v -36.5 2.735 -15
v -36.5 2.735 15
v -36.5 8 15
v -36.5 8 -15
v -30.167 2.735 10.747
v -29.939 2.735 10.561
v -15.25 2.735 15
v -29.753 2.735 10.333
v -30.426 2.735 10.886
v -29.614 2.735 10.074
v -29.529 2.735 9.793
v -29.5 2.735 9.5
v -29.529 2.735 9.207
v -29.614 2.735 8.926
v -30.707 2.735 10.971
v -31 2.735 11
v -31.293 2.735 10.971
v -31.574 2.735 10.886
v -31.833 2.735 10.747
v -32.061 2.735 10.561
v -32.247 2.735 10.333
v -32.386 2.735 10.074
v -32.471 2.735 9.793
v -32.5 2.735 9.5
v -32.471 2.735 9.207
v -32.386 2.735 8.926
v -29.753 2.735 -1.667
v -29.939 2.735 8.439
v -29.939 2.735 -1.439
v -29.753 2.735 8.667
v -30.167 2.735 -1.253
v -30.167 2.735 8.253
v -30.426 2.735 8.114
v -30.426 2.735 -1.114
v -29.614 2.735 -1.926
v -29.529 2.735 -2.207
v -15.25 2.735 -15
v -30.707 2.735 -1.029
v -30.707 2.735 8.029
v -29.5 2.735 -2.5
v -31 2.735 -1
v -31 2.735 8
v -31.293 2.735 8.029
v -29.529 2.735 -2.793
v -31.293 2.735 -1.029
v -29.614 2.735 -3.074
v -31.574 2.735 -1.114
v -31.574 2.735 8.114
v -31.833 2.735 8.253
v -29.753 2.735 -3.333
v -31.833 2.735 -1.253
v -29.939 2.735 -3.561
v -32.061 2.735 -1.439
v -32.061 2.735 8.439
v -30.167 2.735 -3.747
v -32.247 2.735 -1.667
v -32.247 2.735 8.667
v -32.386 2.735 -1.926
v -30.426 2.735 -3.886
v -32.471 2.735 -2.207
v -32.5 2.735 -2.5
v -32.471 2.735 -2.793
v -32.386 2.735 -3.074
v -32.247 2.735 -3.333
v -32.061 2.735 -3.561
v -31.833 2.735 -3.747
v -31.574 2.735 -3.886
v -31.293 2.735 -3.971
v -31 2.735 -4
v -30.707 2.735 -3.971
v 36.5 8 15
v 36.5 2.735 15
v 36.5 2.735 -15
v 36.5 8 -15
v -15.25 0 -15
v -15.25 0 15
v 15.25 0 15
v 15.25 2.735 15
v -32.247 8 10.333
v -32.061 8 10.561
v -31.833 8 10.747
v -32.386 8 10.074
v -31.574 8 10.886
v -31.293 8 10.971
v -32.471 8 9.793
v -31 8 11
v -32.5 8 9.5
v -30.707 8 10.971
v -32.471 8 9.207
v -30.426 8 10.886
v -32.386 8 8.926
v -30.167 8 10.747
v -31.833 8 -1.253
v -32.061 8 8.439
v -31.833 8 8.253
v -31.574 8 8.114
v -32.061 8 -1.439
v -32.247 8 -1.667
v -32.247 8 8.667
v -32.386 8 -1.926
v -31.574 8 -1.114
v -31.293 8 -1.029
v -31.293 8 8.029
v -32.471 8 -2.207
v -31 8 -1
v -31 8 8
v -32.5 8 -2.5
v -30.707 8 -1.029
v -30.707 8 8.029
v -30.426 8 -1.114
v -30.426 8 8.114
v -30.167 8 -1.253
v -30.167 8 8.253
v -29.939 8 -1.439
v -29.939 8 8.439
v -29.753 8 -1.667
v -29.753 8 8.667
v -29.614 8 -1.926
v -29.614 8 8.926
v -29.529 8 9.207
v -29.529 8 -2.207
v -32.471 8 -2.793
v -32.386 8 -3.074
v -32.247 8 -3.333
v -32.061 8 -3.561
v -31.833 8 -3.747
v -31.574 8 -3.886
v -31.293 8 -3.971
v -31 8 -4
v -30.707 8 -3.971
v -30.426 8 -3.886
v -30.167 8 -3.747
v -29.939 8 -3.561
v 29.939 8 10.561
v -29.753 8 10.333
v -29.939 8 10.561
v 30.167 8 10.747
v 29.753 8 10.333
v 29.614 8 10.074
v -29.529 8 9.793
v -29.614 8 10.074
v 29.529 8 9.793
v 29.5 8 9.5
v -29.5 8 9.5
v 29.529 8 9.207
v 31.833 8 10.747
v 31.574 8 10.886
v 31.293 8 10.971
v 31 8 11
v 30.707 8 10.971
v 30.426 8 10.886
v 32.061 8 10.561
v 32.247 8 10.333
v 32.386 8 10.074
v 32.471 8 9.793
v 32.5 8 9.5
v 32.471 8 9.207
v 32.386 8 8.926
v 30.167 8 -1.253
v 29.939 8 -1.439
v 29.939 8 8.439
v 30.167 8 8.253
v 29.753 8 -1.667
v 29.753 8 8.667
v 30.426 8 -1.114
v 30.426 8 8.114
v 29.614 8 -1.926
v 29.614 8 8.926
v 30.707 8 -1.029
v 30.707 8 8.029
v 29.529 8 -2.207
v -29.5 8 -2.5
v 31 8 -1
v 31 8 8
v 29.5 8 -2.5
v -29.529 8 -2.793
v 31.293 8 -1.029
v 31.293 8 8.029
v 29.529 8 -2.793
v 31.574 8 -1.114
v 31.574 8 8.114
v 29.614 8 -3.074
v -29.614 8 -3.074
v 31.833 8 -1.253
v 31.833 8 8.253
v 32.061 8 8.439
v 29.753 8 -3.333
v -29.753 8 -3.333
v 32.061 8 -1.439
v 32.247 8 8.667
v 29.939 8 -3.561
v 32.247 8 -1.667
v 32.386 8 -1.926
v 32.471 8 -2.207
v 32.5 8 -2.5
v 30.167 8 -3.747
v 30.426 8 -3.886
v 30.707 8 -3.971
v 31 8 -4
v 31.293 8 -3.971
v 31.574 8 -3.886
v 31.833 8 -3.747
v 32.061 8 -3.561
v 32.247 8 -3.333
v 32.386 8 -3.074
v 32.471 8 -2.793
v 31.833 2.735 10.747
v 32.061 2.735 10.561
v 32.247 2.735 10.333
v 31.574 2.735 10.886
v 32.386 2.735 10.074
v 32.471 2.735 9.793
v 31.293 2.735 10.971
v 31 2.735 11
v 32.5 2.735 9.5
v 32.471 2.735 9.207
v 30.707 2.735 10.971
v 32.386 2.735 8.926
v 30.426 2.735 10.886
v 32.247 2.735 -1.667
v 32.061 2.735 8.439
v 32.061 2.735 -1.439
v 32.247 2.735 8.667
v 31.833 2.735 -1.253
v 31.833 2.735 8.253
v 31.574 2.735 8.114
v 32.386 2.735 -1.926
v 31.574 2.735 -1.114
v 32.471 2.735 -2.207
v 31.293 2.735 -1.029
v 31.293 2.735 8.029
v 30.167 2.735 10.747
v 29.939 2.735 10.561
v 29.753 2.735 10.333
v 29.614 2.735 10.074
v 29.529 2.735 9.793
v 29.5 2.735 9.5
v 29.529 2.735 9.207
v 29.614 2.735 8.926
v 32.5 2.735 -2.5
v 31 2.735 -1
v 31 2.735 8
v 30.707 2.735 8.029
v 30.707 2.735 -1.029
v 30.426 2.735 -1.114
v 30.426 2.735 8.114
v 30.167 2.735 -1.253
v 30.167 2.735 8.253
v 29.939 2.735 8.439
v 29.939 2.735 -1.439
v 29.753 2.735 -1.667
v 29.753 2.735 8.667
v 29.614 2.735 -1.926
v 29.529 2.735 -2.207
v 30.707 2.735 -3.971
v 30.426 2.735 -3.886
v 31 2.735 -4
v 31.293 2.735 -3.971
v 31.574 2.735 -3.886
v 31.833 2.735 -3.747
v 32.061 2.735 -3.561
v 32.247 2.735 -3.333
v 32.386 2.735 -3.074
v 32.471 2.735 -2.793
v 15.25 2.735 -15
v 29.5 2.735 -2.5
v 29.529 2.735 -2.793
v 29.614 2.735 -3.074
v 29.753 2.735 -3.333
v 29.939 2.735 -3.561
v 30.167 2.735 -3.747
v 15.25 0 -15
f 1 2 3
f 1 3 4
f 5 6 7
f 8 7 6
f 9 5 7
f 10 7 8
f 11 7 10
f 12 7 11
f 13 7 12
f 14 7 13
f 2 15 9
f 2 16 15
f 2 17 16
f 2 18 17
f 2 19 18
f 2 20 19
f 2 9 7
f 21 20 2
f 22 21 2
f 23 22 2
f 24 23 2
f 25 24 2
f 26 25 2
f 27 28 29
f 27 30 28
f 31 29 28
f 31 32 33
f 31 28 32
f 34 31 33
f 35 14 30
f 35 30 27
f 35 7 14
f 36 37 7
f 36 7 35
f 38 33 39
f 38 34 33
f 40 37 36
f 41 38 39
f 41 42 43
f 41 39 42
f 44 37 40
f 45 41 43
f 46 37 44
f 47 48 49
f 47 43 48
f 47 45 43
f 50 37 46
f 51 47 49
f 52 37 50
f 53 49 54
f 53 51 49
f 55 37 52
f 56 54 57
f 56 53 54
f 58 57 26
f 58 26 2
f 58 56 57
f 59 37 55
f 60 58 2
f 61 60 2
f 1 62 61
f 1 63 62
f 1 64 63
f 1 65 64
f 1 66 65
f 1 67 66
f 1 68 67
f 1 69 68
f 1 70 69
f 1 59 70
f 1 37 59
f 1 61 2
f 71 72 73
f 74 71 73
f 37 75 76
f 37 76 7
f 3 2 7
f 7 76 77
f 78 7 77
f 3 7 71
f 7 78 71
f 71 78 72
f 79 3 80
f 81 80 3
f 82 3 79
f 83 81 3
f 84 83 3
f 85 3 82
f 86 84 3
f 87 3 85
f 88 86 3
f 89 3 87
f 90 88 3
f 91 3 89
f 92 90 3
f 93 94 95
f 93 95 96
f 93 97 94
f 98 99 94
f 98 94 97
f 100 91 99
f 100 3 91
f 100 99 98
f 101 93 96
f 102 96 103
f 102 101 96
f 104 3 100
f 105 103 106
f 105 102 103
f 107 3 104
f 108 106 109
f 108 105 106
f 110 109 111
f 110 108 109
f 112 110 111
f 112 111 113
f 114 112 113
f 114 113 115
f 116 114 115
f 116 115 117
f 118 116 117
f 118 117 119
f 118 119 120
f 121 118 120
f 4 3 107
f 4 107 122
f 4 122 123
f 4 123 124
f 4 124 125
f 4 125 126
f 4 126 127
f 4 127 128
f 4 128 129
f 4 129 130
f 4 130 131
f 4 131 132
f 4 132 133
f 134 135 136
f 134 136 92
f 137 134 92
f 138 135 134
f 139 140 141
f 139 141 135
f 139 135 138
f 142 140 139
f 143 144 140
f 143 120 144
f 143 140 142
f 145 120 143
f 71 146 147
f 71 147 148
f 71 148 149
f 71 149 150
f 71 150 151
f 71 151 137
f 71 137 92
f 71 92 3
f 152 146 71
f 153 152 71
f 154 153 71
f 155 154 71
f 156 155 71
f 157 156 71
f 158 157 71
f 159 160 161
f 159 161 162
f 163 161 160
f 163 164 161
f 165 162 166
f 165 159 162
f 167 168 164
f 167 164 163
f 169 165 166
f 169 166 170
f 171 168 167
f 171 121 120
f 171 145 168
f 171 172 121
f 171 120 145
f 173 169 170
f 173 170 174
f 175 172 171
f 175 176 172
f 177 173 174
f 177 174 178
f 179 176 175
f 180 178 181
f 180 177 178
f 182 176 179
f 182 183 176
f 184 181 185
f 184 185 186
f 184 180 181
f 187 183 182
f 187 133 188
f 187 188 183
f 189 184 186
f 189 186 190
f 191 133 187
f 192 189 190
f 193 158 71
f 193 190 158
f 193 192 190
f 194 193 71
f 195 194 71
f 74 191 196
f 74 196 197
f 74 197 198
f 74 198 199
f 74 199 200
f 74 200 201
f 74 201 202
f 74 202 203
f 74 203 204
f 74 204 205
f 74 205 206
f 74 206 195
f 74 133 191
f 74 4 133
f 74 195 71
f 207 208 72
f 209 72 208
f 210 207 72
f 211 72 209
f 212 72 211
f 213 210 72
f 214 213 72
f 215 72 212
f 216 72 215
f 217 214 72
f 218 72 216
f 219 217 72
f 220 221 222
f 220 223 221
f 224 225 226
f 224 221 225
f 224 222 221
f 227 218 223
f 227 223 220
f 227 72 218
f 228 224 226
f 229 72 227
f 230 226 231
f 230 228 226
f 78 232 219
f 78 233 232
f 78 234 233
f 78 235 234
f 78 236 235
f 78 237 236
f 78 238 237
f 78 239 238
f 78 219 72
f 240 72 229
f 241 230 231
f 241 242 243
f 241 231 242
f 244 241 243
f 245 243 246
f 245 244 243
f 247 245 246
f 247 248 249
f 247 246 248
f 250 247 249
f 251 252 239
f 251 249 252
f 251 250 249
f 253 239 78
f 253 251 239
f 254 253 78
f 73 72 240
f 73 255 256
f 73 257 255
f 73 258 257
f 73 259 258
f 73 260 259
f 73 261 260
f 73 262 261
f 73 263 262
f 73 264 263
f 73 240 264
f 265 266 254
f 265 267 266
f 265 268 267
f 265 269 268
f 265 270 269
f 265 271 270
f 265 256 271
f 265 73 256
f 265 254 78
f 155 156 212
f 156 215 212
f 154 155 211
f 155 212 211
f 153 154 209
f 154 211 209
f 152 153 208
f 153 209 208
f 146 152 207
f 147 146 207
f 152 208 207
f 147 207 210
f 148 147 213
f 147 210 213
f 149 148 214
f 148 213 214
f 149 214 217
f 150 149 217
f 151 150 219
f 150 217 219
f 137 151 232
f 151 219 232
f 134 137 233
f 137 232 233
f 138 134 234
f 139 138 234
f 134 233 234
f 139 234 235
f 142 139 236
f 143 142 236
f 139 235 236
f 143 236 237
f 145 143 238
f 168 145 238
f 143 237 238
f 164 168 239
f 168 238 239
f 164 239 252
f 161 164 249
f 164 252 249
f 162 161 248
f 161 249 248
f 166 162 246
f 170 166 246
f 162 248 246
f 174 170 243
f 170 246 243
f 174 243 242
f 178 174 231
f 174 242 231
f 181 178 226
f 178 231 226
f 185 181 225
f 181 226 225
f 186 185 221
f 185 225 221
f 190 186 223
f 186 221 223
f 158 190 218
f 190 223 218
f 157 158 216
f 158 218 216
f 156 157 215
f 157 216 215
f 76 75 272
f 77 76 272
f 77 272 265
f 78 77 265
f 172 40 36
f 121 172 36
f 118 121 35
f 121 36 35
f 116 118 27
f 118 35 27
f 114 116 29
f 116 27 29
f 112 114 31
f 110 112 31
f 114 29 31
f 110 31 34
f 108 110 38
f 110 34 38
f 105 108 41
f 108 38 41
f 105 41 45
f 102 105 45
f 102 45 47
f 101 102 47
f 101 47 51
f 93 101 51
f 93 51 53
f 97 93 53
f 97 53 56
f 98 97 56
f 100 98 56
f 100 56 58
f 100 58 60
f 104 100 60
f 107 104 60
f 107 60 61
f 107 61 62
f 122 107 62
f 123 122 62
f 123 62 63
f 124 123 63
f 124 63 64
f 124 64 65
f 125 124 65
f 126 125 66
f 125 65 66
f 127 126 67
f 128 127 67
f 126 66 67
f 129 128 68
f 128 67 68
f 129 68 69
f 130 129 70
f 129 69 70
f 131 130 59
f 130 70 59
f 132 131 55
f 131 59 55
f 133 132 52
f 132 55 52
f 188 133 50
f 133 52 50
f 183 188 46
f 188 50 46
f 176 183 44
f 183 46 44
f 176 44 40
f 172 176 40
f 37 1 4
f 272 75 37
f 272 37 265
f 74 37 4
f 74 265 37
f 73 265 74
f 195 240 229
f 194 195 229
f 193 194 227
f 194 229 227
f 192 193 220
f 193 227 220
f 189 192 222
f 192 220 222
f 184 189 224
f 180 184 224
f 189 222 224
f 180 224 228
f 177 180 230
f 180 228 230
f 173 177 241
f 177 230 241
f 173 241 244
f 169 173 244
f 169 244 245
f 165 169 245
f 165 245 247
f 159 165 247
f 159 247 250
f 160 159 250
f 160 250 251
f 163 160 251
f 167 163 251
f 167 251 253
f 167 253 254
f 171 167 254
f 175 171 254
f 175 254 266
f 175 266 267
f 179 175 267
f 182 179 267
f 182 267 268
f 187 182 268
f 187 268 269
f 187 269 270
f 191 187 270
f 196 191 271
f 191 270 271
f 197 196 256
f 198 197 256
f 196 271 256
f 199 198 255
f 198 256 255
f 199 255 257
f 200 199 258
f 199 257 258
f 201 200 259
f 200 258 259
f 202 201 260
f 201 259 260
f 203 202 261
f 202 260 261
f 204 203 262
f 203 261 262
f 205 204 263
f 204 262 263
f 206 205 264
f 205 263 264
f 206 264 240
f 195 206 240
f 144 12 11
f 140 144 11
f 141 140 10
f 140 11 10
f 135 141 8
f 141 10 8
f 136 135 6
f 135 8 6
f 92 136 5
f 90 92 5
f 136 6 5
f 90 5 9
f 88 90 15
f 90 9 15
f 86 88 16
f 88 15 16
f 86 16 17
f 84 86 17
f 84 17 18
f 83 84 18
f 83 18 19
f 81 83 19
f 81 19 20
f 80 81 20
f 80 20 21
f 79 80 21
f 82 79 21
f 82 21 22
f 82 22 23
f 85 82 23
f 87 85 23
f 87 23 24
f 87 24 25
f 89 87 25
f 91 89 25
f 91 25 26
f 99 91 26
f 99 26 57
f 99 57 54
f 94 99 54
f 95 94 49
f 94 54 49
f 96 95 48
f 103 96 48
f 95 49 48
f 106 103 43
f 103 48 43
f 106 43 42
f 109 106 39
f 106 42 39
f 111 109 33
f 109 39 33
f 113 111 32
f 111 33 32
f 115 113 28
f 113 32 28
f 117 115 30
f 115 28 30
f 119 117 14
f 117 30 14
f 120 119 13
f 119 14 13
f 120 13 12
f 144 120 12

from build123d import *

# Parameters (mm, degrees)
SKETCH_1_W          = 73
SKETCH_1_H          = 30
EXTRUDE_1_DEPTH     = 8
SKETCH_2_W          = 21.25
SKETCH_2_H          = 2.735303139
CUT_EXTRUDE_1_DEPTH = 48.919202831
SKETCH_3_R          = 1.5
CUT_EXTRUDE_2_DEPTH = 45


with BuildPart() as part:
    # 草图1 → 凸台-拉伸1 (new body)
    with BuildSketch(Plane(origin=(0, 0, 0), x_dir=(1, 0, 0), z_dir=(0, 1, 0))):
        Rectangle(SKETCH_1_W, SKETCH_1_H)
    extrude(amount=EXTRUDE_1_DEPTH)

    # 草图2 → 切除-拉伸1 (cut, through all)
    with BuildSketch(Plane(origin=(0, 0, -15), x_dir=(-1, 0, 0), z_dir=(0, 0, -1))):
        with Locations((-25.875, 1.367651569)):
            Rectangle(SKETCH_2_W, SKETCH_2_H)
        with Locations((25.875, 1.367651569)):
            Rectangle(SKETCH_2_W, SKETCH_2_H)
    extrude(amount=-CUT_EXTRUDE_1_DEPTH, mode=Mode.SUBTRACT)

    # 草图3 → 切除-拉伸2 (cut, symmetric)
    with BuildSketch(Plane(origin=(59.282070169, -20, -16.5), x_dir=(1, 0, 0), z_dir=(0, -1, 0))):
        with Locations((-28.282070169, 14)):
            Circle(SKETCH_3_R)
        with Locations((-90.282070169, 14)):
            Circle(SKETCH_3_R)
        with Locations((-90.282070169, 26)):
            Circle(SKETCH_3_R)
        with Locations((-28.282070169, 26)):
            Circle(SKETCH_3_R)
    extrude(amount=CUT_EXTRUDE_2_DEPTH, both=True, mode=Mode.SUBTRACT)


solid = part.part
